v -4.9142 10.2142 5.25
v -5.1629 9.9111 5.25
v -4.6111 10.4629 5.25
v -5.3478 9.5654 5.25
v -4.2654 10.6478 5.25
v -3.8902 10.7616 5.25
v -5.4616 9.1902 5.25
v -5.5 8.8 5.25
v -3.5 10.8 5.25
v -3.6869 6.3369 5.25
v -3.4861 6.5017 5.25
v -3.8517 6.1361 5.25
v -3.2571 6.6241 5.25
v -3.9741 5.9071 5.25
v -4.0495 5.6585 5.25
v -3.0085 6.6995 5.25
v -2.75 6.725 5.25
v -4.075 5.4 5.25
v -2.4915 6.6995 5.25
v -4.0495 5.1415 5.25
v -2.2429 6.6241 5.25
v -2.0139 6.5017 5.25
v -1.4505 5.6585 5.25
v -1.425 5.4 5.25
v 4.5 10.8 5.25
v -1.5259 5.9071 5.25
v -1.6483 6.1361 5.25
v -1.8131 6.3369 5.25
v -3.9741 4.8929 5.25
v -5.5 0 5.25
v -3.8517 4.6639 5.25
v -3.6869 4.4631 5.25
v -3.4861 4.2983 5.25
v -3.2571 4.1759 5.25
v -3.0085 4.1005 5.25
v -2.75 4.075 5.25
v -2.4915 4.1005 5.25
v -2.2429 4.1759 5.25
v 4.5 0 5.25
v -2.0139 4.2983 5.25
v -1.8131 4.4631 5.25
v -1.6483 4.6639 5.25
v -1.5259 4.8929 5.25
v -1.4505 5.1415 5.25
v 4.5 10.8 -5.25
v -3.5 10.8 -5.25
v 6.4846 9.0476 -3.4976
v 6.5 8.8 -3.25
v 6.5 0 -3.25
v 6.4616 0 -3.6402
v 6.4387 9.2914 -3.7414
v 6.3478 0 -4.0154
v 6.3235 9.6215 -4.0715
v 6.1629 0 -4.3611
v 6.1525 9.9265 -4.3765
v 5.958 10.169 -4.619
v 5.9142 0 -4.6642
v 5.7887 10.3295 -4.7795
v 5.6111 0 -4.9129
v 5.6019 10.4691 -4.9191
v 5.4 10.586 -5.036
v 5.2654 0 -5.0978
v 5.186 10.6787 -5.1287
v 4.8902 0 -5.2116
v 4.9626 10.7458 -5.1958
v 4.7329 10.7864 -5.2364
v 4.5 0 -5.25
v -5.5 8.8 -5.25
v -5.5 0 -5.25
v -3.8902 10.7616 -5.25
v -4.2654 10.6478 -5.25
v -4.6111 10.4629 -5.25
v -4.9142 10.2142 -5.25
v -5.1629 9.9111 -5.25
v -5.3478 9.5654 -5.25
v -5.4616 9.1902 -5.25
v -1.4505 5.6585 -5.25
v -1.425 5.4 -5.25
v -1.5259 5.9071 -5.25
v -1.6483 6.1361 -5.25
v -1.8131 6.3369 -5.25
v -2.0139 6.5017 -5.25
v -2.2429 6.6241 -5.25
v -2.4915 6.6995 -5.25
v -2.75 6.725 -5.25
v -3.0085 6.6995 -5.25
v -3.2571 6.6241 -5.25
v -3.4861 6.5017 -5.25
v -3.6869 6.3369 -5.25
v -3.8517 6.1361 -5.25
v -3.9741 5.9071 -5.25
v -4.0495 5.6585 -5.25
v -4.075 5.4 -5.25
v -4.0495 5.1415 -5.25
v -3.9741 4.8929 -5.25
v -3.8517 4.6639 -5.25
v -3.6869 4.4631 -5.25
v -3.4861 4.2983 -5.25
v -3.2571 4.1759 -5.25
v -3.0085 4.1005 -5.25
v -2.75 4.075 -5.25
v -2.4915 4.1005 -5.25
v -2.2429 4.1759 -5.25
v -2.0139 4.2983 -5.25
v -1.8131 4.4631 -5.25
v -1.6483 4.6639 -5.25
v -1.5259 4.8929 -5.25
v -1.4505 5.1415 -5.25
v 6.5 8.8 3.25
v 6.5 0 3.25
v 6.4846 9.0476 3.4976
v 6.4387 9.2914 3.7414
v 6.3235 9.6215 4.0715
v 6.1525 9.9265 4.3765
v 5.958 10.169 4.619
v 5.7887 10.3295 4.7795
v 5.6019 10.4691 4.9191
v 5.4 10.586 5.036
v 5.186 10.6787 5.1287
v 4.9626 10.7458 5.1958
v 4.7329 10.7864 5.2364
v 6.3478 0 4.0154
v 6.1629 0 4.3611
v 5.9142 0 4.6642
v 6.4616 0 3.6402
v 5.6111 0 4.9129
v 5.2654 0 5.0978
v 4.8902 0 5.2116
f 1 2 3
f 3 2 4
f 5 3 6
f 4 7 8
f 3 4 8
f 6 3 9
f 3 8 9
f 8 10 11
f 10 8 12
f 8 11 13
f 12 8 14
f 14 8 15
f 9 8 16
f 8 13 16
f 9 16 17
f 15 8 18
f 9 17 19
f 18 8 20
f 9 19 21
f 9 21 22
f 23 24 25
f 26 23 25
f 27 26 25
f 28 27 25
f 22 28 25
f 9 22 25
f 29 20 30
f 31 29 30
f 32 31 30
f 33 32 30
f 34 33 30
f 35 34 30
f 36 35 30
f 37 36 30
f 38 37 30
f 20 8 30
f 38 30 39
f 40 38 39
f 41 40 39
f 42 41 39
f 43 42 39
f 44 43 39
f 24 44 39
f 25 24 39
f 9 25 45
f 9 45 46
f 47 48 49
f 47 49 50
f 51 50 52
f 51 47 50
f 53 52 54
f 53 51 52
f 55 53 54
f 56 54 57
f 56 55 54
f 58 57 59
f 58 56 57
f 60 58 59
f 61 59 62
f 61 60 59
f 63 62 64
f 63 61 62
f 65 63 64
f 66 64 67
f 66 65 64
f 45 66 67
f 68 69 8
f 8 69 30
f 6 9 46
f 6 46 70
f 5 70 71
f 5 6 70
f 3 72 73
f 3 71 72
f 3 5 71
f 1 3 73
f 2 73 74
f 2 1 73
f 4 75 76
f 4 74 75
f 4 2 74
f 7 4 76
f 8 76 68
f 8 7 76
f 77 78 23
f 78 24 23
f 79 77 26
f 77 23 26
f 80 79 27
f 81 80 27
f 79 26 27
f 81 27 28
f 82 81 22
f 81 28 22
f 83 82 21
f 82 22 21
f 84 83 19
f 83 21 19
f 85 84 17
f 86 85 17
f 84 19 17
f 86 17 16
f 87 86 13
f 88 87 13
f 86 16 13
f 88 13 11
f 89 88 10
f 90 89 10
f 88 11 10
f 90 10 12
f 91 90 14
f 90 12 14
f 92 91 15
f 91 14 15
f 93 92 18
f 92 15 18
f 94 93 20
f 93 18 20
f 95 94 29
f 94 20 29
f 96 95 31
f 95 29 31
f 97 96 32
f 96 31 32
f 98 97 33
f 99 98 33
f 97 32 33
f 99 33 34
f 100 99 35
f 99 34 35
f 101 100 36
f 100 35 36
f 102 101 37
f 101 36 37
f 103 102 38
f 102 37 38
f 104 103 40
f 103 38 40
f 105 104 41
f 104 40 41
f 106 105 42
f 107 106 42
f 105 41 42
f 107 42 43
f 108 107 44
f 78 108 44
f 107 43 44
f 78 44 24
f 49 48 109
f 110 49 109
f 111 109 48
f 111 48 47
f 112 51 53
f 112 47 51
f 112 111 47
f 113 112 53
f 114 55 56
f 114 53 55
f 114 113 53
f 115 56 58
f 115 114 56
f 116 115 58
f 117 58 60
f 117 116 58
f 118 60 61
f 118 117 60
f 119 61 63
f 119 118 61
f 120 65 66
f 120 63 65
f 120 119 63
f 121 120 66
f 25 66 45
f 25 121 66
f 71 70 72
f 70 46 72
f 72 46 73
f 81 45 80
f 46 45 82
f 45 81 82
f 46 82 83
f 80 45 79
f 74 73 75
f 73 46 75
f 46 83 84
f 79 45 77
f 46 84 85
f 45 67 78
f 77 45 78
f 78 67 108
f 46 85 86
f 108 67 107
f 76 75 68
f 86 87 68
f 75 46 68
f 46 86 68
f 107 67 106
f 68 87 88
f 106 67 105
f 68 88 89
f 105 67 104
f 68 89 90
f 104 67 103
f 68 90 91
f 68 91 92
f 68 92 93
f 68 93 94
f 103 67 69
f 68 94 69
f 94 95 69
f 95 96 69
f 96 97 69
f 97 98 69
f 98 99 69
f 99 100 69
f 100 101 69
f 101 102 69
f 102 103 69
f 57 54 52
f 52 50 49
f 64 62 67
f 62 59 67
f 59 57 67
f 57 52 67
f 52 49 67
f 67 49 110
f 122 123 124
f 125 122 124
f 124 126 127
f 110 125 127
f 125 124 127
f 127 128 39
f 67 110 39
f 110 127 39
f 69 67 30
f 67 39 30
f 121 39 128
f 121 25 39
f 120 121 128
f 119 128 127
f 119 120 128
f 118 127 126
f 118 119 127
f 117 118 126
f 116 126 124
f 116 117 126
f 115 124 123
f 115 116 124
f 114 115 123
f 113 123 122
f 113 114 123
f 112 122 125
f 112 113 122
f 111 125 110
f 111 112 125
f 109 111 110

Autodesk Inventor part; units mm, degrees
ref_plane "YZ Plane" through (0, 0, 0) normal (1, 0, 0) x (0, 1, 0)
ref_plane "XZ Plane" through (0, 0, 0) normal (0, 1, 0) x (-1, 0, 0)
ref_plane "XY Plane" through (0, 0, 0) normal (0, 0, 1) x (1, 0, 0)
sketch "Эскиз2" plane through (0, 0, 0) normal (0, 1, 0) x (-1, 0, 0)
  line L0 (5.5, 5.25) -> (-5.5, 5.25)
  line L1 (-5.5, 5.25) -> (-5.5, -5.25)
  line L2 (-5.5, -5.25) -> (5.5, -5.25)
  line L3 (5.5, -5.25) -> (5.5, 5.25)
  line L4 (5.5, 0) -> (-5.5, 0) construction
  line L5 (0, 5.25) -> (0, -5.25) construction
  circle A0 centre (0, 0) radius 1.25
  line L6 (-5.5, -5.25) -> (-6.5, -5.25)
  line L7 (-6.5, -5.25) -> (-6.5, 5.25)
  line L8 (-6.5, 5.25) -> (-5.5, 5.25)
  line L9 (-5.5, 5.25) -> (-5.5, -5.25)
  dimension "d0" = 11
  dimension "d1" = 10.5
  dimension "d2" = 2.5
  dimension "d12" = 1
extrude "Выдавливание1" add sketch "Эскиз2" along normal blind 10.8 contours L3 L2 L1 L0 | L1 L6 L7 L8 | A0
sketch "Эскиз4" plane through (-5.5, 0, 5.25) normal (0, 0, 1) x (1, 0, 0)
  line L0 (5.5, 0) -> (2.75, 10.8) construction
  line L1 (5.5, 10.8) -> (0, 10.8) construction
  line L2 (0, 0) -> (0, 10.8) construction
  line L3 (0, 5.4) -> (5.5, 5.4) construction
  line L4 (5.5, 0) -> (5.5, 10.8) construction
  circle A0 centre (2.75, 5.4) radius 1.325
  dimension "d8" = 2.65
extrude "Выдавливание3" cut sketch "Эскиз4" against normal blind 10.5
fillet "Сопряжение2" radius 2 4 edges at (6.5, 5.4, 5.25) (6.5, 5.4, -5.25) (6.5, 10.8, 0) (-5.5, 10.8, 0)
properties part number "pusher"
